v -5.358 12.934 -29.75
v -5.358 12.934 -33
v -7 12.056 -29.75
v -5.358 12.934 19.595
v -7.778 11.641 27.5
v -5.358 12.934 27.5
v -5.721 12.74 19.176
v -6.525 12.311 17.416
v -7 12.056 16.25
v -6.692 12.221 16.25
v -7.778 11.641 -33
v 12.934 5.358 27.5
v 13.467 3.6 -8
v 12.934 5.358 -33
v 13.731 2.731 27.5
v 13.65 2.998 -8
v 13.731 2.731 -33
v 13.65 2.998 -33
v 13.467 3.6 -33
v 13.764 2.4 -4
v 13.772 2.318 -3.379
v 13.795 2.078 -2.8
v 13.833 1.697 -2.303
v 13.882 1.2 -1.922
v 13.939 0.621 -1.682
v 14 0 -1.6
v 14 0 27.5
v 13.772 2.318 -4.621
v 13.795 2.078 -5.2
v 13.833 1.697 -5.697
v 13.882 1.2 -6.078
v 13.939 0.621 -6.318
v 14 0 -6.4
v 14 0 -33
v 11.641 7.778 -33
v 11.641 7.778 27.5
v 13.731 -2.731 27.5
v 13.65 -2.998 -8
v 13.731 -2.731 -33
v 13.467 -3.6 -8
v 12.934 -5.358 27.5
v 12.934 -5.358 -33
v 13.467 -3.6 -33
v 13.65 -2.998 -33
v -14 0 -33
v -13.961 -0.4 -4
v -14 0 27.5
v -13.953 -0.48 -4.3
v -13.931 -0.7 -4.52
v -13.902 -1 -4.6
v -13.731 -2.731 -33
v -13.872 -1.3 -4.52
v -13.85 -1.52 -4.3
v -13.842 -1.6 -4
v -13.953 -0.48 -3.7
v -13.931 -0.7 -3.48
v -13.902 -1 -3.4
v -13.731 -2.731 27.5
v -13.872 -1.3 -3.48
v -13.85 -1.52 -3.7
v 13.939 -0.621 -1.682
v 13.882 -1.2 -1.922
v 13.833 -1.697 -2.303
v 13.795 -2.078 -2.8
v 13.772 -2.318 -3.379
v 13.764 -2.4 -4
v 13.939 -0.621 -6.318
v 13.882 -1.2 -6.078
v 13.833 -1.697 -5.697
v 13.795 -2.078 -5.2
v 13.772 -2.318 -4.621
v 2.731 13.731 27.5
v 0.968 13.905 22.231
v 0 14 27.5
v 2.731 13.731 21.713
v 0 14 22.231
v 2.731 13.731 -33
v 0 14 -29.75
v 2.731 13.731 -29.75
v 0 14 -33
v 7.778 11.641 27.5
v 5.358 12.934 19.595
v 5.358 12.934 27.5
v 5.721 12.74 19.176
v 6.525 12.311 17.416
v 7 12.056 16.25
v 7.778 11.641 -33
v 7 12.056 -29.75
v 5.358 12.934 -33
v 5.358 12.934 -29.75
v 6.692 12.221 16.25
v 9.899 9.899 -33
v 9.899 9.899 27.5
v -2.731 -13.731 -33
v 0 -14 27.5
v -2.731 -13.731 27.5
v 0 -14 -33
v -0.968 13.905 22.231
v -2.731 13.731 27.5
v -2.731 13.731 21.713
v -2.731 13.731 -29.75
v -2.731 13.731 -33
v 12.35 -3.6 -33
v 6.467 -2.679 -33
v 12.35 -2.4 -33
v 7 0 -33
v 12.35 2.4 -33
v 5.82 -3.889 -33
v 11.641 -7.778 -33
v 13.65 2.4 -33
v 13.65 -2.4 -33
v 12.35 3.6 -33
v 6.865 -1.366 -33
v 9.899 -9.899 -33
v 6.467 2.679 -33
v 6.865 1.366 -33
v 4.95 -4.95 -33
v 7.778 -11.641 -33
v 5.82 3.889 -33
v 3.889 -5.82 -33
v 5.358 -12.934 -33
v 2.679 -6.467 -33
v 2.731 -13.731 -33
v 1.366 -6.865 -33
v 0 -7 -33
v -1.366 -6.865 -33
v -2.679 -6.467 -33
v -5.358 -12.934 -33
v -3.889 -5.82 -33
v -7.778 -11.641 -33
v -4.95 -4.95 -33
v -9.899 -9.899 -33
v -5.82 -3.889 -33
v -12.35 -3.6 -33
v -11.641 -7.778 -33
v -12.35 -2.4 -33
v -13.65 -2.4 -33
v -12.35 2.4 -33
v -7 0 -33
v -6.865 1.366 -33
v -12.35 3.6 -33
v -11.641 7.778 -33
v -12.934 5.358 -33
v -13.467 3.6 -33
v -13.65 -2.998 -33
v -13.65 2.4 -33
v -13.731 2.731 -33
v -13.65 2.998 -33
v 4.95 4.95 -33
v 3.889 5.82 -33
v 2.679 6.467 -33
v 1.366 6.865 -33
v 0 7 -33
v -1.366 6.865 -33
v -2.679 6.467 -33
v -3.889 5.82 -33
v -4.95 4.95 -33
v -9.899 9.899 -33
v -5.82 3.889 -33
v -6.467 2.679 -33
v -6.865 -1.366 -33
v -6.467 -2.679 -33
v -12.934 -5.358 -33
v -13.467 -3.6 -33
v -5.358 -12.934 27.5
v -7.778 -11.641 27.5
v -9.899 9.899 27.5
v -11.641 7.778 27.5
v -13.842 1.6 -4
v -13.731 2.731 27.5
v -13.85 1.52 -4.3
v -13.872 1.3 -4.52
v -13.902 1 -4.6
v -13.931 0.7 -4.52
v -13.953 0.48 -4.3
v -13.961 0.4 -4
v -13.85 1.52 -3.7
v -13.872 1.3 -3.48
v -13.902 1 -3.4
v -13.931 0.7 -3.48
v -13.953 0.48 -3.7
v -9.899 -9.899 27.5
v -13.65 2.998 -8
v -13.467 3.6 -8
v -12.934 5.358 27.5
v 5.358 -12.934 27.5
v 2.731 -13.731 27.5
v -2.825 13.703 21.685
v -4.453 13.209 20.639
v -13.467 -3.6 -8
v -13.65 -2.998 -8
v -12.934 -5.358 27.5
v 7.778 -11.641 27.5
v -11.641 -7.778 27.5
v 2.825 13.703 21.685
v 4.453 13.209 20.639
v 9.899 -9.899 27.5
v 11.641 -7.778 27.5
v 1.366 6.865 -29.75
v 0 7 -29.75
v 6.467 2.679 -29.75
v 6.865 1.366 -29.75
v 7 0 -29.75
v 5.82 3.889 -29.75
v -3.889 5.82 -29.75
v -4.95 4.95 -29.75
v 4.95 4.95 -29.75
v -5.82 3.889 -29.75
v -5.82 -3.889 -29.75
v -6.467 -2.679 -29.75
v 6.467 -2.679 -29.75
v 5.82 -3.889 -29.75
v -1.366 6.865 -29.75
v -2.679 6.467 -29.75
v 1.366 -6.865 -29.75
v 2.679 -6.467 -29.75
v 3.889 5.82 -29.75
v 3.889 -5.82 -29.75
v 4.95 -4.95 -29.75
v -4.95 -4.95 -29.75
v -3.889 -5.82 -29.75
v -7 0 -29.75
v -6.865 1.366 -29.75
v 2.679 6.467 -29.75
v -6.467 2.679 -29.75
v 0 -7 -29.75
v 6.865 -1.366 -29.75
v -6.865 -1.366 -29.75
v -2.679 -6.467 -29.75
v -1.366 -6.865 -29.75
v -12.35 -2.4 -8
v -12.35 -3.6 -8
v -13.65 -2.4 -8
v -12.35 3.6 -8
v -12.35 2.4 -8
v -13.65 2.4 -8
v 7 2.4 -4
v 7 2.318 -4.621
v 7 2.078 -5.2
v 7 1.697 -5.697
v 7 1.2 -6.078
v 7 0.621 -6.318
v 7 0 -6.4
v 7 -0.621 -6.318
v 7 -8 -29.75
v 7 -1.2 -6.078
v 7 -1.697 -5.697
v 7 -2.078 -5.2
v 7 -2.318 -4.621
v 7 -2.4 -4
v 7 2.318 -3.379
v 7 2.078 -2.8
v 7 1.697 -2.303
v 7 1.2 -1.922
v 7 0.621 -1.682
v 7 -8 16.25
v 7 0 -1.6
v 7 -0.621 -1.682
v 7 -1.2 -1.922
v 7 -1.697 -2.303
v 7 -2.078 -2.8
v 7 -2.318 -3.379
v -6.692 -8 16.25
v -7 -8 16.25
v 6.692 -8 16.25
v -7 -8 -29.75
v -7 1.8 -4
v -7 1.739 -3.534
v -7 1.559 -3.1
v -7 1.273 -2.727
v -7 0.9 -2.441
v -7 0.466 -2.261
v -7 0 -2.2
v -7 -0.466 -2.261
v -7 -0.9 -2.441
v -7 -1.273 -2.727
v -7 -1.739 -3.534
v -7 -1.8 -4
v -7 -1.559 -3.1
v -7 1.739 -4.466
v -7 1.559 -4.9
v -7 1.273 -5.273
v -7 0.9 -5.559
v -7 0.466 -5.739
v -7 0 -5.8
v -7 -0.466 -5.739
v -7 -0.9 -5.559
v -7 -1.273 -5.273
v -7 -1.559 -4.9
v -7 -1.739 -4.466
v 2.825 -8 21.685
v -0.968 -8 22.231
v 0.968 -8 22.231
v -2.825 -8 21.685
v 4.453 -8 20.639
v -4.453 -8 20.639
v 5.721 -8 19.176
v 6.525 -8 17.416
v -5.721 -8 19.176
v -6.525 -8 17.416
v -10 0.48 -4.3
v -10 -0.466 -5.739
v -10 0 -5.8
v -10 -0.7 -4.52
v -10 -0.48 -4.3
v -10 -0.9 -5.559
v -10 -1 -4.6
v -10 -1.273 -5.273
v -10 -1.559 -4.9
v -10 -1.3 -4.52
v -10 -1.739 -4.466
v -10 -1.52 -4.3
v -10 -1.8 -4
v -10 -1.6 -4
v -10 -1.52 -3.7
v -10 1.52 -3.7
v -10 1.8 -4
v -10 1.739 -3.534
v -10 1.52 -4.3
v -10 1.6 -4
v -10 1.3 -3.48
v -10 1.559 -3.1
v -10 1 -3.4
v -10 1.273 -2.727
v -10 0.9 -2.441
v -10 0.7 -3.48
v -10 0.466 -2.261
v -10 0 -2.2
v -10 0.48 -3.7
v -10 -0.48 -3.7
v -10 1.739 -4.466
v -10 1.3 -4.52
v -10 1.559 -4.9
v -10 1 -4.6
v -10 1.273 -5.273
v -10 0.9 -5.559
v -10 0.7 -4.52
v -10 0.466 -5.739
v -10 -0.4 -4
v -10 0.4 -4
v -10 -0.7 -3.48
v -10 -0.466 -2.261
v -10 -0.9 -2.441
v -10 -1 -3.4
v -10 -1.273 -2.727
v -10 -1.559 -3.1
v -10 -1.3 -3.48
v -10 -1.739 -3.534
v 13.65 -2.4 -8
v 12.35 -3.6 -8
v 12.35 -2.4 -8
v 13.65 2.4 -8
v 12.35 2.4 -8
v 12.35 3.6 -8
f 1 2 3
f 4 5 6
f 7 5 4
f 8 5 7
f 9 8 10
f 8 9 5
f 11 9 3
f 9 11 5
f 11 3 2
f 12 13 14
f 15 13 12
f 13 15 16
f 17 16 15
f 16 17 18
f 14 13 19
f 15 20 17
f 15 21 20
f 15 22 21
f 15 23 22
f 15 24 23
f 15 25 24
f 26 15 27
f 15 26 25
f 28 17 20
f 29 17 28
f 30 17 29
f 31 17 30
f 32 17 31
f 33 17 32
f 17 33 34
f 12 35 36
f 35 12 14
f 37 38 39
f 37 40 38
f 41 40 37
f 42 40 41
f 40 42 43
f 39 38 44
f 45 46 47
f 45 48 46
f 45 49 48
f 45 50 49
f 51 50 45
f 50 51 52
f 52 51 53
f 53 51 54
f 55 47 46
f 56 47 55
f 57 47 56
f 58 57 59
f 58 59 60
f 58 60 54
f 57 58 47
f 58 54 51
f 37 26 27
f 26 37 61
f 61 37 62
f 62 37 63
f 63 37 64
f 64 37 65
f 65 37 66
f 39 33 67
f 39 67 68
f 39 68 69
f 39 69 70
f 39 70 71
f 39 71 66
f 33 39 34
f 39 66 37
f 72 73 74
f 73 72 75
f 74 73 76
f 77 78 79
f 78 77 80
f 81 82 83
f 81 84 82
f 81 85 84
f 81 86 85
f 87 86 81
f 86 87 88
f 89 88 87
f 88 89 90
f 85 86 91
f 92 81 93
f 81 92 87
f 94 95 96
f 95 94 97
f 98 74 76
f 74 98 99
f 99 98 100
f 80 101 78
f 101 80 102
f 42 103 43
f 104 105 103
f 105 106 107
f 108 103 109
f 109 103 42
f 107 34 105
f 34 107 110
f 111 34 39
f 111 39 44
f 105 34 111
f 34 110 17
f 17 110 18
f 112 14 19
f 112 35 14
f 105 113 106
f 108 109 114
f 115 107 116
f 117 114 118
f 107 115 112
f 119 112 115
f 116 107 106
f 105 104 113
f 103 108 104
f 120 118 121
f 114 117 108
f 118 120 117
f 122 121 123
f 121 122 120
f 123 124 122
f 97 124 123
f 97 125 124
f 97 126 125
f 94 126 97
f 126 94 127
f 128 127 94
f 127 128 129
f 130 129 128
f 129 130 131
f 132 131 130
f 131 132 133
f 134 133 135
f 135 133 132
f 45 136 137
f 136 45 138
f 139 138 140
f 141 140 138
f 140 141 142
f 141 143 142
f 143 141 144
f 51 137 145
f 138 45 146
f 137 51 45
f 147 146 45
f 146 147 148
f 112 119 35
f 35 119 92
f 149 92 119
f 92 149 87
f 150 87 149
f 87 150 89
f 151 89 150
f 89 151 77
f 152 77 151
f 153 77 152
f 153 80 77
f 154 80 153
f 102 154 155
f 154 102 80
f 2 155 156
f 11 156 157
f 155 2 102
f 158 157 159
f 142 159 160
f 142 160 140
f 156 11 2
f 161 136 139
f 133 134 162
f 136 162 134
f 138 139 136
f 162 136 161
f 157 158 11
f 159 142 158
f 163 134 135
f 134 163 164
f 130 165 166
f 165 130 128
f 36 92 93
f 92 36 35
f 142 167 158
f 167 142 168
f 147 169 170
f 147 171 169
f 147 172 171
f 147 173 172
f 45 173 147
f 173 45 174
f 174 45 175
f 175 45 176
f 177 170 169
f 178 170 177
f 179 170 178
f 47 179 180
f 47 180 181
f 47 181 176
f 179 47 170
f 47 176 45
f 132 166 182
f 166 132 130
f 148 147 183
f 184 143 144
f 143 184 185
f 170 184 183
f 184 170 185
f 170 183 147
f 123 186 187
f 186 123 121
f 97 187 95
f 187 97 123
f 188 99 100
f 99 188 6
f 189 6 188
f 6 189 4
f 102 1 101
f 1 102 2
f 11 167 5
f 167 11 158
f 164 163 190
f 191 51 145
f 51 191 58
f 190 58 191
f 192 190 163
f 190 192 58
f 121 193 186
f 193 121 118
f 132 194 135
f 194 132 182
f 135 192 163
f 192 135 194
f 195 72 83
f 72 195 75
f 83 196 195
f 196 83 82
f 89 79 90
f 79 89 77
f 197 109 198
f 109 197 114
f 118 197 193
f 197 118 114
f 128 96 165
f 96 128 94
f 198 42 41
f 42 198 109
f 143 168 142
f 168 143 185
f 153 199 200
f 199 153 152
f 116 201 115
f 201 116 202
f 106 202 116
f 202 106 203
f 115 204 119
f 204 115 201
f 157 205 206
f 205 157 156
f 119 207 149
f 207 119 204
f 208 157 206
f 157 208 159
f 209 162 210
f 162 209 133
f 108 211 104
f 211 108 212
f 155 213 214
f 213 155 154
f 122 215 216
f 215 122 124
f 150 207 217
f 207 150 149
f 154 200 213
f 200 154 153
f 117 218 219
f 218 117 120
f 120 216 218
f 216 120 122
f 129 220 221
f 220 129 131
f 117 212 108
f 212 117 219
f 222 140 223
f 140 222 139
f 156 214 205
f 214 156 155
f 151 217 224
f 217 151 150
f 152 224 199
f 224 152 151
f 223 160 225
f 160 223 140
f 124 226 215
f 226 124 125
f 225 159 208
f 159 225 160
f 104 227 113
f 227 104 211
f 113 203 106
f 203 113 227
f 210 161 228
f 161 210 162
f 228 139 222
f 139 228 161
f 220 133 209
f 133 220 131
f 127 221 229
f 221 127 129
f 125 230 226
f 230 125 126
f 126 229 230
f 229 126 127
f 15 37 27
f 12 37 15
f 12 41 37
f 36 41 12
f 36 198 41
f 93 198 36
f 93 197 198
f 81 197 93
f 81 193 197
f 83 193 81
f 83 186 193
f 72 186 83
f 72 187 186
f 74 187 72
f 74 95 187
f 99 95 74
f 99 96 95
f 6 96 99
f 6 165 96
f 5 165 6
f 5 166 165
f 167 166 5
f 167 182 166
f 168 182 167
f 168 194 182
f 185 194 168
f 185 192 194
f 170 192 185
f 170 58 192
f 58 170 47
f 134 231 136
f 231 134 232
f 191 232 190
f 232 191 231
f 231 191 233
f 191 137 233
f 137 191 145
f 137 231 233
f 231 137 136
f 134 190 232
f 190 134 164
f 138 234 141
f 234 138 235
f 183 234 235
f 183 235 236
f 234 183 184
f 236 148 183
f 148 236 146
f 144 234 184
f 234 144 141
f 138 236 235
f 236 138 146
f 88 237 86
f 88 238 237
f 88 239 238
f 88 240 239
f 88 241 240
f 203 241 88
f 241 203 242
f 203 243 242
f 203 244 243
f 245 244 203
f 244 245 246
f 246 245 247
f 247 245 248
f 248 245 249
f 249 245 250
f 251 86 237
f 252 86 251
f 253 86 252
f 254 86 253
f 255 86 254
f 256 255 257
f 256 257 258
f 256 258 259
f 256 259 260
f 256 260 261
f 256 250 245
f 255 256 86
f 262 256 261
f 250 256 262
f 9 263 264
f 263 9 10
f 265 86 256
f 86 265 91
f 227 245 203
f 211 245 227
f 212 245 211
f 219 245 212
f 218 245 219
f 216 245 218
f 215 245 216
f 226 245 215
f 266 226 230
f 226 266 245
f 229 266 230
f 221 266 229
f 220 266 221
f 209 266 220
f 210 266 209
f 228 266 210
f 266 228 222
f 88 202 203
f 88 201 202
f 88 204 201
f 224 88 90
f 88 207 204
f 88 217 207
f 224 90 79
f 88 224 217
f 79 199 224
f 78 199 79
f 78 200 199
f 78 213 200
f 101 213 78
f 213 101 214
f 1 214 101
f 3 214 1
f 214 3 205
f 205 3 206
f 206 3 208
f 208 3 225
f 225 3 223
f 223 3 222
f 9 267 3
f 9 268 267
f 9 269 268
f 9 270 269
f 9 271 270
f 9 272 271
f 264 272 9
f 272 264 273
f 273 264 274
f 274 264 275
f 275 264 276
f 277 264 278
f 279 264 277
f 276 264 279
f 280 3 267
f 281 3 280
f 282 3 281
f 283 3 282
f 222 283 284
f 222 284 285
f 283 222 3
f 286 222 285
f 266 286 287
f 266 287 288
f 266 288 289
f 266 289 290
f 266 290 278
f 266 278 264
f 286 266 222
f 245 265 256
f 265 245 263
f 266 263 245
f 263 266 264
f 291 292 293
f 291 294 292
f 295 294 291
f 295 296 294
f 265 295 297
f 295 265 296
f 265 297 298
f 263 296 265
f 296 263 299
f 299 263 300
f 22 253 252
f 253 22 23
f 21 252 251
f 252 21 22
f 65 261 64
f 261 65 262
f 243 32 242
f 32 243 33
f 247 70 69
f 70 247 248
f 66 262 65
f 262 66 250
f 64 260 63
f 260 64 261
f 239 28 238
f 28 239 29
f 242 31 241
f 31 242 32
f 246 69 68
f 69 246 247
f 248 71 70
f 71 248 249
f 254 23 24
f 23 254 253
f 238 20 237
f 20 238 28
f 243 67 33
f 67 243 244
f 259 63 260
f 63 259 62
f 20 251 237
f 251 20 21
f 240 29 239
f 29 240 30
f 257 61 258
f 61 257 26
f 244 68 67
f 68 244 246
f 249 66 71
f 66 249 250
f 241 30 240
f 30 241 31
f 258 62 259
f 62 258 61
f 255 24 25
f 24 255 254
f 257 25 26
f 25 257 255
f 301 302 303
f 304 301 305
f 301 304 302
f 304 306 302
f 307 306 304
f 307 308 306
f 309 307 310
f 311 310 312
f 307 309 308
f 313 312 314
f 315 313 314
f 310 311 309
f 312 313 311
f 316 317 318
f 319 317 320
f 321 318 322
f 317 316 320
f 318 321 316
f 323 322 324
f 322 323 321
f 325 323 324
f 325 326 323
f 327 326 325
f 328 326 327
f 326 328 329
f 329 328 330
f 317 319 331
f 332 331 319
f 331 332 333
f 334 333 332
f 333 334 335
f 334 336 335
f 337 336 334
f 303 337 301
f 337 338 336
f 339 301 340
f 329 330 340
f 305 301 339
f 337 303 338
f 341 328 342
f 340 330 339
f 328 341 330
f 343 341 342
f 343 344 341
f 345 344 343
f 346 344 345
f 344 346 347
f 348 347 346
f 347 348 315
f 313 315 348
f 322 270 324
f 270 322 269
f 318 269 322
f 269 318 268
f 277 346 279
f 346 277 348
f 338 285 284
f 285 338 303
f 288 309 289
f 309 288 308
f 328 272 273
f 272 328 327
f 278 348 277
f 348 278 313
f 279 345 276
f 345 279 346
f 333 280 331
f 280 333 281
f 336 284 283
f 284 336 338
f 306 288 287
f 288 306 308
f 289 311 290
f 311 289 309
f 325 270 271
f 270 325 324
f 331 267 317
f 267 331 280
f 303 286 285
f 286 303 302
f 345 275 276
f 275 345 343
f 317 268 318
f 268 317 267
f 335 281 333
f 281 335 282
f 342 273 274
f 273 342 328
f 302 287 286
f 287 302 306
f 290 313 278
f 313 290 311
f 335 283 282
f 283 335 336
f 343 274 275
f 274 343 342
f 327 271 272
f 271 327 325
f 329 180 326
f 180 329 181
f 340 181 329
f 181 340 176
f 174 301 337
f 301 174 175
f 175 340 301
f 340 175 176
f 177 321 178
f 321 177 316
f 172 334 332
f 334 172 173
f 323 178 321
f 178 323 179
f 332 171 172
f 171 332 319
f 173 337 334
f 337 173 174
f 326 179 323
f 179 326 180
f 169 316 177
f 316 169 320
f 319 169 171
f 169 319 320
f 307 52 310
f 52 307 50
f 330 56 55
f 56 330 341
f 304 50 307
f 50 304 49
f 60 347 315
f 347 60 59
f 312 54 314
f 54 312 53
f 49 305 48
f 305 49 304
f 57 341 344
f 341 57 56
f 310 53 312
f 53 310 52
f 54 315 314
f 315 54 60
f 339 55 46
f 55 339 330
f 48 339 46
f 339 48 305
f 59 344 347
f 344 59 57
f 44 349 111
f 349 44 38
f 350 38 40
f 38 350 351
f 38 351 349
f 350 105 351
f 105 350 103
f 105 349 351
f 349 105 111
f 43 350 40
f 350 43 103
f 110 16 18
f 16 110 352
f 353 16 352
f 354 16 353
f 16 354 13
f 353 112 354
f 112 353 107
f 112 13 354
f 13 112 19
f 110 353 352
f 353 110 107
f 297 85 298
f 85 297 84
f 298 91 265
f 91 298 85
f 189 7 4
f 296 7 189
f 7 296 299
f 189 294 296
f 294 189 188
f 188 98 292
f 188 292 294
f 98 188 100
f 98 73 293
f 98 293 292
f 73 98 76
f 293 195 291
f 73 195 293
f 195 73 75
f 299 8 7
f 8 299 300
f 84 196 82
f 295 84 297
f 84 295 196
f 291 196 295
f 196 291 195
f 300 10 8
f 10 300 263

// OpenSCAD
height = 55;
dia = 28;
ch = 46;

module plug(d) 
{
rad = d/2;
q = d/3;
gz = -(8+height/2);
gh = height;

	difference() 
	{
    union() {
	  cylinder(r=rad, h=height, center=true, $fn=32);

     translate([0,0,-30])
     difference() {
	    cylinder(r=rad, h=6, center=true, $fn=32);
	    cylinder(r=rad/2, h=6, center=true, $fn=32);
      };
     }
	  translate([0,rad/2-4,rad/2-height/4])
		 cube([14,22,ch],center=true);
// LED Hole
     translate([10,0,-4])
     rotate([0,90,0])
          cylinder(r=2.4,h=20,center=true,$fn=24);
// Phototransitor Holes
     translate([-8,0,-4])
     rotate([0,90,0])
          cylinder(r=1.8,h=4,center=true,$fn=24);
     translate([-8,1,-4])
     rotate([0,90,0])
          cylinder(r=0.6,h=16,center=true,$fn=12);
     translate([-8,-1,-4])
     rotate([0,90,0])
          cylinder(r=0.6,h=16,center=true,$fn=12);

// Wire Grooves
     translate([rad-1,-3,gz])
          cube([1.3,1.2,gh],center=true);
     translate([rad-1,3,gz])
          cube([1.3,1.2,gh],center=true);

     translate([2-d,0,0]) {
        translate([rad-1,-3,gz])
           cube([1.3,1.2,gh],center=true);
        translate([rad-1,3,gz])
           cube([1.3,1.2,gh],center=true);
	  }
    translate([0,3,height/2-12])
      rotate([90,0,0])
        cylinder(r=6.8,h=22,center=true);
//     translate([0,0,0])
//            cube([2,2,height]);
//	  rotate([0,0,90])
//	   translate([0,0,-q])
//		cube([rad,q,q],center=true);
  } // End of difference()
 // sphere(rad-2.5,center=true);
//translate([0,0,-30])
//  difference() {
//	  cylinder(r=rad, h=6, center=true, $fn=32);
//	  cylinder(r=rad/2, h=6, center=true, $fn=32);
//  }
}

plug(dia);
//translate([0,0,-7]) cube([4,4,45],center=true);
